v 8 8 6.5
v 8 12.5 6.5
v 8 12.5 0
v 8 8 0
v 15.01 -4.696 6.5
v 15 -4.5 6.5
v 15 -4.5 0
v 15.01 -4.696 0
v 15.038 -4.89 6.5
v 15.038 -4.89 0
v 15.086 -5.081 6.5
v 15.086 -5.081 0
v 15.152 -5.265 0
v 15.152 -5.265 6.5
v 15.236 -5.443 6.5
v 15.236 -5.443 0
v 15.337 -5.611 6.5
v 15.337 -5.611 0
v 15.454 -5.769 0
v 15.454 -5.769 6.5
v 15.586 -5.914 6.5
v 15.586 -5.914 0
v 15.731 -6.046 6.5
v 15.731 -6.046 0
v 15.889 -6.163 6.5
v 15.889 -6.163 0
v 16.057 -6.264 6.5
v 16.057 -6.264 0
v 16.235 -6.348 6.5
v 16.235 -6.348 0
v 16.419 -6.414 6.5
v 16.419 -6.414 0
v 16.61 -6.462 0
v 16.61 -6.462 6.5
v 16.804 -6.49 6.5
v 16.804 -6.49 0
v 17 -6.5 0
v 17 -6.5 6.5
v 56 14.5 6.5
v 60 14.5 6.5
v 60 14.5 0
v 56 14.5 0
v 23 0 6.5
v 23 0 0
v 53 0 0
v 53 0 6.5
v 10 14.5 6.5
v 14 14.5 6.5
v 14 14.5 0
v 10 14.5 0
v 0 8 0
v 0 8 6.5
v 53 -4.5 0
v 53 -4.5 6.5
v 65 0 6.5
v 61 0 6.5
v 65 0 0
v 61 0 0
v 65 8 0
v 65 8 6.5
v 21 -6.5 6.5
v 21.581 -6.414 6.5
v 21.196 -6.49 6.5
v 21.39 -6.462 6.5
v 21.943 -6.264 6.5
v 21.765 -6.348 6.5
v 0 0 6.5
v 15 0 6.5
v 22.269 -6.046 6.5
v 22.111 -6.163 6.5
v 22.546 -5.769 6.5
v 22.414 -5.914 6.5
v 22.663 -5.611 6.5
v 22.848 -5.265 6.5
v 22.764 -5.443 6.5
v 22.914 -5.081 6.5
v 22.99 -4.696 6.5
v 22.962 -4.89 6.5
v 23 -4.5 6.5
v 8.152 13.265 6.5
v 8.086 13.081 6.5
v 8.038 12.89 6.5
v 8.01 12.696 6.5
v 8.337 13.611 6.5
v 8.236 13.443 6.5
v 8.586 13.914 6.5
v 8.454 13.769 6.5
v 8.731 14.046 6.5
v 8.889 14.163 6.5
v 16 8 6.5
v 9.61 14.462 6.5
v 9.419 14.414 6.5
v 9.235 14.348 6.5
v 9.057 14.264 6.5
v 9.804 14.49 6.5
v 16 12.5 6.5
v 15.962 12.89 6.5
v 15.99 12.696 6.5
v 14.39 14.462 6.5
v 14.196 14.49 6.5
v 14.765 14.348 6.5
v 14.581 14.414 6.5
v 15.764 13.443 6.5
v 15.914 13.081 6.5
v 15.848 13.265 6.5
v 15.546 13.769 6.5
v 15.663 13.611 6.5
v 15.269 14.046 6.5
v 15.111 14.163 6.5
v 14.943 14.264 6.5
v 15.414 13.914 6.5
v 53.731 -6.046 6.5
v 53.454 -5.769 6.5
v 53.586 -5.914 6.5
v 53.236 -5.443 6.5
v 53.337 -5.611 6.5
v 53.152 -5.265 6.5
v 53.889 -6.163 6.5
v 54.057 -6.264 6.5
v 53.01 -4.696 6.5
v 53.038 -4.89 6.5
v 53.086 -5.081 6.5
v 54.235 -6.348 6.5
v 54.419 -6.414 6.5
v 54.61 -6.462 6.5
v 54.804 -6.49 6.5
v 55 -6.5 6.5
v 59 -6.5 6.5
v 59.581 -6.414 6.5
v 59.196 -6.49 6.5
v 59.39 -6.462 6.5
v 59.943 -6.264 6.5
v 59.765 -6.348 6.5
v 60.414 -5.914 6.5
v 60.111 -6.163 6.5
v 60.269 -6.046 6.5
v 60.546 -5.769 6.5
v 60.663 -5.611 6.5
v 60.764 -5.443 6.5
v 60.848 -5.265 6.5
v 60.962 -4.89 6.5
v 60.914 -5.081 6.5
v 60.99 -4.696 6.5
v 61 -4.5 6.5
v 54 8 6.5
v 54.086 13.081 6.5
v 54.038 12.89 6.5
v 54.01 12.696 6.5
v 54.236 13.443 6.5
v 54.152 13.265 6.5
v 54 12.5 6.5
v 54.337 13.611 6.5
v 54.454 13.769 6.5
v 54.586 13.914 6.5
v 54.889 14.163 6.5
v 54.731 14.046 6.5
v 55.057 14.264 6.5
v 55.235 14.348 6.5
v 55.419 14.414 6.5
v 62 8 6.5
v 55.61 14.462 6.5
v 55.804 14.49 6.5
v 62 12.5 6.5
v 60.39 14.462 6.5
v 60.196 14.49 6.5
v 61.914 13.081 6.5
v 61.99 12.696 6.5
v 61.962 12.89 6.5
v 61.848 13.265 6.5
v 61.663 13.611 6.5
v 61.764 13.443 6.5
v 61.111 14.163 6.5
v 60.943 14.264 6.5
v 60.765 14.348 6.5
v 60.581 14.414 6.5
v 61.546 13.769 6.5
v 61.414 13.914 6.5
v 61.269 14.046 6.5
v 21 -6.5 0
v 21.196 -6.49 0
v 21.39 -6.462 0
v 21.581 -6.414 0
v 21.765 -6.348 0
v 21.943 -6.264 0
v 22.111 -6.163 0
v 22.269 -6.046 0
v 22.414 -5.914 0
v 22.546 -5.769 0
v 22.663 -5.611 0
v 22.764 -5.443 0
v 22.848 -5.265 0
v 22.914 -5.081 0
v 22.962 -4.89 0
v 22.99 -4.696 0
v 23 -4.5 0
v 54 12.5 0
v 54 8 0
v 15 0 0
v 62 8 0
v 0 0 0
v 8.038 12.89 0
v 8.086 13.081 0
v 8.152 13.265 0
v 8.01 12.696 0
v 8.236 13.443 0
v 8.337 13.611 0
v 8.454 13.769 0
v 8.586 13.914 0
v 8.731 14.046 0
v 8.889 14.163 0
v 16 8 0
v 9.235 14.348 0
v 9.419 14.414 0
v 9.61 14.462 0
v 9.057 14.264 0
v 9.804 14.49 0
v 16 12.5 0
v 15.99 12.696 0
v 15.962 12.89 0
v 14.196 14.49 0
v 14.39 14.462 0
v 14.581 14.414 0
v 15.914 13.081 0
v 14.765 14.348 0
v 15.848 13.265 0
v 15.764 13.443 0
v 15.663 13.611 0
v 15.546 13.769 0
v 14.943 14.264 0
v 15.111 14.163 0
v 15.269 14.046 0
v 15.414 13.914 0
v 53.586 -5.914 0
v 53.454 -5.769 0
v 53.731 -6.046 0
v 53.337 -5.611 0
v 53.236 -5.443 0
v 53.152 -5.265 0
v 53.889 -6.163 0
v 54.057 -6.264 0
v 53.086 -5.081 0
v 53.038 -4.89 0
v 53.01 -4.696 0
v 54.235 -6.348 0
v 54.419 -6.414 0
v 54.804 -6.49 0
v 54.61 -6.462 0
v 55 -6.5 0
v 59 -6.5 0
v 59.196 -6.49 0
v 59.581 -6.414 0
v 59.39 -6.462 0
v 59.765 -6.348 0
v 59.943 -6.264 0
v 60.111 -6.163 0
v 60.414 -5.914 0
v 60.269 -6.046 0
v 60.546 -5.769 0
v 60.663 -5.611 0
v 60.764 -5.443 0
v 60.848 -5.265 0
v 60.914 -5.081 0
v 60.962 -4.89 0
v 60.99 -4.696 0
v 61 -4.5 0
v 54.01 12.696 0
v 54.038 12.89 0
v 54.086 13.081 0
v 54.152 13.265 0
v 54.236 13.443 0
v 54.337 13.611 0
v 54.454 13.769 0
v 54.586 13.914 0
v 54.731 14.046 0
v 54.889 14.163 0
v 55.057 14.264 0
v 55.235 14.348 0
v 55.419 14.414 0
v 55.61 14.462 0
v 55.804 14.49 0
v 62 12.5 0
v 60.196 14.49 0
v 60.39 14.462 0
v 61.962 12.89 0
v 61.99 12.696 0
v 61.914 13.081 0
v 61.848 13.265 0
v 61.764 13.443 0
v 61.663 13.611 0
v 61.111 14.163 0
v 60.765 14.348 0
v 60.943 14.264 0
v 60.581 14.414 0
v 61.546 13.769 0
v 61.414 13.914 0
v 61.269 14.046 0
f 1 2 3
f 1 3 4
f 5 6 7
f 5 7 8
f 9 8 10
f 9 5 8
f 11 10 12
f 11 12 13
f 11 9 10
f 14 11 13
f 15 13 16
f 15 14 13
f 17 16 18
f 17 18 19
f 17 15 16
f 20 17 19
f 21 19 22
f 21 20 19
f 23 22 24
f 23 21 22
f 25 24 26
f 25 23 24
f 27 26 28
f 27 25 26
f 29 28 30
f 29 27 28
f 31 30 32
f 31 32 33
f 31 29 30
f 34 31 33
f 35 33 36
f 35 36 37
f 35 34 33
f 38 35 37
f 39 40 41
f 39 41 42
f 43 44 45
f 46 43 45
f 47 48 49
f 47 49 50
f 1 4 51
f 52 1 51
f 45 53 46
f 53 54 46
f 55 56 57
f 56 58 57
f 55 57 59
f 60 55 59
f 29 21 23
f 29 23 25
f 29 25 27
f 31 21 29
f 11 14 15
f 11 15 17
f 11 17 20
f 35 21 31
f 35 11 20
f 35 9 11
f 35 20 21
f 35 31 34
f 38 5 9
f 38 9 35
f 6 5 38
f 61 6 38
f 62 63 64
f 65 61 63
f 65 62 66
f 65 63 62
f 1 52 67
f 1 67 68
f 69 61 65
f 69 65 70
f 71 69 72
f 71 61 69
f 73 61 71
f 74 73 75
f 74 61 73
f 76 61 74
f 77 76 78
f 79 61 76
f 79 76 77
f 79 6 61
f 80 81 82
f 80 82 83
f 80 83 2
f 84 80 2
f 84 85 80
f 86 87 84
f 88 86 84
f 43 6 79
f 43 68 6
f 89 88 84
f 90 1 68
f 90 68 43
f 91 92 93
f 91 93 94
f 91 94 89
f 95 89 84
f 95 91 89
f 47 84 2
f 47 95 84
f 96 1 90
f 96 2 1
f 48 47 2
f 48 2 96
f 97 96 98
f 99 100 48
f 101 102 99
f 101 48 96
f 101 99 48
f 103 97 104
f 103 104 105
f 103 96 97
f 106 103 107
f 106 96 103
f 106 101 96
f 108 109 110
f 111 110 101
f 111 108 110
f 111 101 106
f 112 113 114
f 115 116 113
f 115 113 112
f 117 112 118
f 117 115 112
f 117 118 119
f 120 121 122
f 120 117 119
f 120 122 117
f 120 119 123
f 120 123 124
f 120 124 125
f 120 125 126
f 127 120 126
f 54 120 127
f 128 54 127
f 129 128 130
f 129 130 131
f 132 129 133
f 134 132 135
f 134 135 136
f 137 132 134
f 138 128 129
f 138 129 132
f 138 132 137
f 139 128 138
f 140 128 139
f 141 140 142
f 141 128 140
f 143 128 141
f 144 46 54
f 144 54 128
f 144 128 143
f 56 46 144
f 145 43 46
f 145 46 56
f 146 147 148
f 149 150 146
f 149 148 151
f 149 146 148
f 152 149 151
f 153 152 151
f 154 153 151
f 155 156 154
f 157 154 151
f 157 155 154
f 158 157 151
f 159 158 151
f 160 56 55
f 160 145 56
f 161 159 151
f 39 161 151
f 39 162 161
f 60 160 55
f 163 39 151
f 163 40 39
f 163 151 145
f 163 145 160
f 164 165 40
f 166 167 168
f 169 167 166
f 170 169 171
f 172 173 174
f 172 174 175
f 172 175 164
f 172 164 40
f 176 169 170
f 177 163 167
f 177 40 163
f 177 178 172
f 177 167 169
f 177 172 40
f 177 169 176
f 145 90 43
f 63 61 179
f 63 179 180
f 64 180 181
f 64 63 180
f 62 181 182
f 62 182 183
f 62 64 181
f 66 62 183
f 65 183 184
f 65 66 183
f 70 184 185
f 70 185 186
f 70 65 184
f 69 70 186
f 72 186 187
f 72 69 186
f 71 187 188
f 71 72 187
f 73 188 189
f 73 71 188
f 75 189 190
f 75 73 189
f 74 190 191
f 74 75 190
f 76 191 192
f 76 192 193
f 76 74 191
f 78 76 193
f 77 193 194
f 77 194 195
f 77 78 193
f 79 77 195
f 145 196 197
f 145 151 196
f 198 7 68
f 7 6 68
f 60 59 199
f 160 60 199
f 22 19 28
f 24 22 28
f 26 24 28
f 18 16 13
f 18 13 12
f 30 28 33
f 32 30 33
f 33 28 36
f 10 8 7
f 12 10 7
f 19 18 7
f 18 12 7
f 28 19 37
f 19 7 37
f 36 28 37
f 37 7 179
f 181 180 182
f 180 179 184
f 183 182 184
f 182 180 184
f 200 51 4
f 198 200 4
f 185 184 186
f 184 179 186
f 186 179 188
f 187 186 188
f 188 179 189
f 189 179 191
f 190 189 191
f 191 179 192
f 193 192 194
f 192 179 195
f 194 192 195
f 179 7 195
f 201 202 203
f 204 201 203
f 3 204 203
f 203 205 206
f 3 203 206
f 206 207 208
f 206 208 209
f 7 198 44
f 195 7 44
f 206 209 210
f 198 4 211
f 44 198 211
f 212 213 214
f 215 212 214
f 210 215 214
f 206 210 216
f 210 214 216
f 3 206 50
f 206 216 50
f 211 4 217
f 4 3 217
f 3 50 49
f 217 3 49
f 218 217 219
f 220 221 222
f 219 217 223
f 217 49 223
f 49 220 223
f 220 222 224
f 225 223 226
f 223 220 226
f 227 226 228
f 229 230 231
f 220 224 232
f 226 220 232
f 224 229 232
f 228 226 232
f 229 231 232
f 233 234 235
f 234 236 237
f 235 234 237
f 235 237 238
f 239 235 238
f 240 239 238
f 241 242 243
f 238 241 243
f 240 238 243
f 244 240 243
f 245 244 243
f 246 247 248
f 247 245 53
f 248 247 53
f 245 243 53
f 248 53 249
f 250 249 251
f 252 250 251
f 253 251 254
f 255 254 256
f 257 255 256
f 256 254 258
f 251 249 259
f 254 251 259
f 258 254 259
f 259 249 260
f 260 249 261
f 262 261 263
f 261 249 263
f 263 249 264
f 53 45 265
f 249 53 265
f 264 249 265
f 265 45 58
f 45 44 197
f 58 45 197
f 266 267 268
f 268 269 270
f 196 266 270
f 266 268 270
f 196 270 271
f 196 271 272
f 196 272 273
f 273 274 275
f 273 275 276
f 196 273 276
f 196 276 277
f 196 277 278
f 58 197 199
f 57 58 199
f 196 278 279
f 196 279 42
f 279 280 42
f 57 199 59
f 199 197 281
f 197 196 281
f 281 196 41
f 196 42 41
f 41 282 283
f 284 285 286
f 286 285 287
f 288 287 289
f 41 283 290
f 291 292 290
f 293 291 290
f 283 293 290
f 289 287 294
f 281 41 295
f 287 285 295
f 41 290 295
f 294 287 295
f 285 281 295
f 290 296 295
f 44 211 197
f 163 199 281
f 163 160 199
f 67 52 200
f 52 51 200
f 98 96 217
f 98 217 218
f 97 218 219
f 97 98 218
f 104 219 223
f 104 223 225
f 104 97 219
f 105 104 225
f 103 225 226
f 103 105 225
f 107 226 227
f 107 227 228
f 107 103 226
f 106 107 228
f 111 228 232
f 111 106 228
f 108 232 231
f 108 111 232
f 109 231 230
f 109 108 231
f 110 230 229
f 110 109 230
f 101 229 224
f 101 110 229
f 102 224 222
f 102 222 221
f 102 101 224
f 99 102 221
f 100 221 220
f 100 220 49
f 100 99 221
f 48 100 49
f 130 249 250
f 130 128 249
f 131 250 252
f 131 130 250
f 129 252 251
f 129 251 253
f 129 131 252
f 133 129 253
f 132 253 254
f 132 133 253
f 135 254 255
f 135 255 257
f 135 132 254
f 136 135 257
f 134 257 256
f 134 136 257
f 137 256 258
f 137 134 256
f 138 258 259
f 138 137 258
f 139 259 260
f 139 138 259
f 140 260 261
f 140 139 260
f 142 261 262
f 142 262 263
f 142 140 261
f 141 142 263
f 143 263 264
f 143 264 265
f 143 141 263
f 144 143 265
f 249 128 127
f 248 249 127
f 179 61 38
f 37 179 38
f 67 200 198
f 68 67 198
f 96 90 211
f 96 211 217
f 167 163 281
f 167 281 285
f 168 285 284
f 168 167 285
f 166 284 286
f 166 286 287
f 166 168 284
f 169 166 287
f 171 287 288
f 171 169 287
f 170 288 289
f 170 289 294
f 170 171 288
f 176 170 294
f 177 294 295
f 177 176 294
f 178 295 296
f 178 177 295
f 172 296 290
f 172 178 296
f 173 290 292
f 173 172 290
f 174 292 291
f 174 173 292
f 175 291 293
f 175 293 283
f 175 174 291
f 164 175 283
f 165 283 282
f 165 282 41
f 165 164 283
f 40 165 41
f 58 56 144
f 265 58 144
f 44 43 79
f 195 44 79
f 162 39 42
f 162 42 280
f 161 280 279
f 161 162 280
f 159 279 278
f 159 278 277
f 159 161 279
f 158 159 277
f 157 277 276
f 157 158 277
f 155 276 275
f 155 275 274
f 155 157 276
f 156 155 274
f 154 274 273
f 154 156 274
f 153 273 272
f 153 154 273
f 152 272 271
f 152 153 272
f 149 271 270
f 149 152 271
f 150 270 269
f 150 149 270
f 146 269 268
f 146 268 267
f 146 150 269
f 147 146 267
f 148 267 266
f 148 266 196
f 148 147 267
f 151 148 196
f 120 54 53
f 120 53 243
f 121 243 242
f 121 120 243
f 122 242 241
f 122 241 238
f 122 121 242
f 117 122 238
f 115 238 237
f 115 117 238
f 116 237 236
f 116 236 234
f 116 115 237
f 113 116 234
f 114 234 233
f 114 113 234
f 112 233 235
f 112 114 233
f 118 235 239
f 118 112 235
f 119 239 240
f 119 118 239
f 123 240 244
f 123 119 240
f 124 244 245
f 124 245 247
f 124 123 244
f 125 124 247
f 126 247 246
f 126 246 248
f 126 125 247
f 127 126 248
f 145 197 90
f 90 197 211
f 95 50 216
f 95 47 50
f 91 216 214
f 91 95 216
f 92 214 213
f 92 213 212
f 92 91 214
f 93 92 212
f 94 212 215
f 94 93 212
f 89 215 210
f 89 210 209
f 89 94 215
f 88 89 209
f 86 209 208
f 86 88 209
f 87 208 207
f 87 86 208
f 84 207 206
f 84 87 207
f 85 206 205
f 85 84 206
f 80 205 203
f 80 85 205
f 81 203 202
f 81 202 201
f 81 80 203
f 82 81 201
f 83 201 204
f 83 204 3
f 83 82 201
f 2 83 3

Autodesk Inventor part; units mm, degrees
ref_plane "YZ Plane" through (0, 0, 0) normal (1, 0, 0) x (0, 1, 0)
ref_plane "XZ Plane" through (0, 0, 0) normal (0, 1, 0) x (-1, 0, 0)
ref_plane "XY Plane" through (0, 0, 0) normal (0, 0, 1) x (1, 0, 0)
sketch "Sketch1" plane through (0, 0, 0) normal (0, 0, 1) x (1, 0, 0)
  line L0 (0, 0) -> (65, 0)
  line L1 (65, 0) -> (65, 8)
  line L2 (65, 8) -> (0, 8)
  line L3 (0, 8) -> (0, 0)
  dimension "d0" = 8
  dimension "d1" = 65
extrude "Extrusion1" add sketch "Sketch1" along normal blind 6.5
sketch "Sketch2" plane through (0, 0, 6.5) normal (0, 0, 1) x (1, 0, 0)
  line L0 (0, 0) -> (65, 0) projected
  line L1 (65, 8) -> (0, 8) projected
  line L2 (0, 8) -> (0, 0) projected
  line L3 (15, 0) -> (23, 0)
  line L4 (23, 0) -> (23, -4.5)
  line L5 (21, -6.5) -> (17, -6.5)
  line L6 (15, -4.5) -> (15, 0)
  line L7 (53, 0) -> (61, 0)
  line L8 (61, 0) -> (61, -4.5)
  line L9 (59, -6.5) -> (55, -6.5)
  line L10 (53, -4.5) -> (53, 0)
  line L11 (8, 8) -> (16, 8)
  line L12 (16, 8) -> (16, 12.5)
  line L13 (14, 14.5) -> (10, 14.5)
  line L14 (8, 12.5) -> (8, 8)
  line L15 (54, 8) -> (62, 8)
  line L16 (62, 8) -> (62, 12.5)
  line L17 (60, 14.5) -> (56, 14.5)
  line L18 (54, 12.5) -> (54, 8)
  arc A0 (15, -4.5) -> (17, -6.5) centre (17, -4.5) ccw
  arc A1 (21, -6.5) -> (23, -4.5) centre (21, -4.5) ccw
  arc A2 (10, 14.5) -> (8, 12.5) centre (10, 12.5) ccw
  arc A3 (16, 12.5) -> (14, 14.5) centre (14, 12.5) ccw
  arc A4 (56, 14.5) -> (54, 12.5) centre (56, 12.5) ccw
  arc A5 (62, 12.5) -> (60, 14.5) centre (60, 12.5) ccw
  arc A6 (53, -4.5) -> (55, -6.5) centre (55, -4.5) ccw
  arc A7 (59, -6.5) -> (61, -4.5) centre (59, -4.5) ccw
  dimension "d4" = 2
  dimension "d5" = 8
  dimension "d6" = 6.5
  dimension "d7" = 6.5
  dimension "d8" = 8
  dimension "d9" = 8
  dimension "d10" = 8
  dimension "d11" = 15
  dimension "d12" = 30
  dimension "d13" = 8
  dimension "d14" = 38
extrude "Extrusion2" add sketch "Sketch2" against normal blind 6.5
properties part number "x_motor_smooth_rod_spacer" material "Plywood, Finish"
